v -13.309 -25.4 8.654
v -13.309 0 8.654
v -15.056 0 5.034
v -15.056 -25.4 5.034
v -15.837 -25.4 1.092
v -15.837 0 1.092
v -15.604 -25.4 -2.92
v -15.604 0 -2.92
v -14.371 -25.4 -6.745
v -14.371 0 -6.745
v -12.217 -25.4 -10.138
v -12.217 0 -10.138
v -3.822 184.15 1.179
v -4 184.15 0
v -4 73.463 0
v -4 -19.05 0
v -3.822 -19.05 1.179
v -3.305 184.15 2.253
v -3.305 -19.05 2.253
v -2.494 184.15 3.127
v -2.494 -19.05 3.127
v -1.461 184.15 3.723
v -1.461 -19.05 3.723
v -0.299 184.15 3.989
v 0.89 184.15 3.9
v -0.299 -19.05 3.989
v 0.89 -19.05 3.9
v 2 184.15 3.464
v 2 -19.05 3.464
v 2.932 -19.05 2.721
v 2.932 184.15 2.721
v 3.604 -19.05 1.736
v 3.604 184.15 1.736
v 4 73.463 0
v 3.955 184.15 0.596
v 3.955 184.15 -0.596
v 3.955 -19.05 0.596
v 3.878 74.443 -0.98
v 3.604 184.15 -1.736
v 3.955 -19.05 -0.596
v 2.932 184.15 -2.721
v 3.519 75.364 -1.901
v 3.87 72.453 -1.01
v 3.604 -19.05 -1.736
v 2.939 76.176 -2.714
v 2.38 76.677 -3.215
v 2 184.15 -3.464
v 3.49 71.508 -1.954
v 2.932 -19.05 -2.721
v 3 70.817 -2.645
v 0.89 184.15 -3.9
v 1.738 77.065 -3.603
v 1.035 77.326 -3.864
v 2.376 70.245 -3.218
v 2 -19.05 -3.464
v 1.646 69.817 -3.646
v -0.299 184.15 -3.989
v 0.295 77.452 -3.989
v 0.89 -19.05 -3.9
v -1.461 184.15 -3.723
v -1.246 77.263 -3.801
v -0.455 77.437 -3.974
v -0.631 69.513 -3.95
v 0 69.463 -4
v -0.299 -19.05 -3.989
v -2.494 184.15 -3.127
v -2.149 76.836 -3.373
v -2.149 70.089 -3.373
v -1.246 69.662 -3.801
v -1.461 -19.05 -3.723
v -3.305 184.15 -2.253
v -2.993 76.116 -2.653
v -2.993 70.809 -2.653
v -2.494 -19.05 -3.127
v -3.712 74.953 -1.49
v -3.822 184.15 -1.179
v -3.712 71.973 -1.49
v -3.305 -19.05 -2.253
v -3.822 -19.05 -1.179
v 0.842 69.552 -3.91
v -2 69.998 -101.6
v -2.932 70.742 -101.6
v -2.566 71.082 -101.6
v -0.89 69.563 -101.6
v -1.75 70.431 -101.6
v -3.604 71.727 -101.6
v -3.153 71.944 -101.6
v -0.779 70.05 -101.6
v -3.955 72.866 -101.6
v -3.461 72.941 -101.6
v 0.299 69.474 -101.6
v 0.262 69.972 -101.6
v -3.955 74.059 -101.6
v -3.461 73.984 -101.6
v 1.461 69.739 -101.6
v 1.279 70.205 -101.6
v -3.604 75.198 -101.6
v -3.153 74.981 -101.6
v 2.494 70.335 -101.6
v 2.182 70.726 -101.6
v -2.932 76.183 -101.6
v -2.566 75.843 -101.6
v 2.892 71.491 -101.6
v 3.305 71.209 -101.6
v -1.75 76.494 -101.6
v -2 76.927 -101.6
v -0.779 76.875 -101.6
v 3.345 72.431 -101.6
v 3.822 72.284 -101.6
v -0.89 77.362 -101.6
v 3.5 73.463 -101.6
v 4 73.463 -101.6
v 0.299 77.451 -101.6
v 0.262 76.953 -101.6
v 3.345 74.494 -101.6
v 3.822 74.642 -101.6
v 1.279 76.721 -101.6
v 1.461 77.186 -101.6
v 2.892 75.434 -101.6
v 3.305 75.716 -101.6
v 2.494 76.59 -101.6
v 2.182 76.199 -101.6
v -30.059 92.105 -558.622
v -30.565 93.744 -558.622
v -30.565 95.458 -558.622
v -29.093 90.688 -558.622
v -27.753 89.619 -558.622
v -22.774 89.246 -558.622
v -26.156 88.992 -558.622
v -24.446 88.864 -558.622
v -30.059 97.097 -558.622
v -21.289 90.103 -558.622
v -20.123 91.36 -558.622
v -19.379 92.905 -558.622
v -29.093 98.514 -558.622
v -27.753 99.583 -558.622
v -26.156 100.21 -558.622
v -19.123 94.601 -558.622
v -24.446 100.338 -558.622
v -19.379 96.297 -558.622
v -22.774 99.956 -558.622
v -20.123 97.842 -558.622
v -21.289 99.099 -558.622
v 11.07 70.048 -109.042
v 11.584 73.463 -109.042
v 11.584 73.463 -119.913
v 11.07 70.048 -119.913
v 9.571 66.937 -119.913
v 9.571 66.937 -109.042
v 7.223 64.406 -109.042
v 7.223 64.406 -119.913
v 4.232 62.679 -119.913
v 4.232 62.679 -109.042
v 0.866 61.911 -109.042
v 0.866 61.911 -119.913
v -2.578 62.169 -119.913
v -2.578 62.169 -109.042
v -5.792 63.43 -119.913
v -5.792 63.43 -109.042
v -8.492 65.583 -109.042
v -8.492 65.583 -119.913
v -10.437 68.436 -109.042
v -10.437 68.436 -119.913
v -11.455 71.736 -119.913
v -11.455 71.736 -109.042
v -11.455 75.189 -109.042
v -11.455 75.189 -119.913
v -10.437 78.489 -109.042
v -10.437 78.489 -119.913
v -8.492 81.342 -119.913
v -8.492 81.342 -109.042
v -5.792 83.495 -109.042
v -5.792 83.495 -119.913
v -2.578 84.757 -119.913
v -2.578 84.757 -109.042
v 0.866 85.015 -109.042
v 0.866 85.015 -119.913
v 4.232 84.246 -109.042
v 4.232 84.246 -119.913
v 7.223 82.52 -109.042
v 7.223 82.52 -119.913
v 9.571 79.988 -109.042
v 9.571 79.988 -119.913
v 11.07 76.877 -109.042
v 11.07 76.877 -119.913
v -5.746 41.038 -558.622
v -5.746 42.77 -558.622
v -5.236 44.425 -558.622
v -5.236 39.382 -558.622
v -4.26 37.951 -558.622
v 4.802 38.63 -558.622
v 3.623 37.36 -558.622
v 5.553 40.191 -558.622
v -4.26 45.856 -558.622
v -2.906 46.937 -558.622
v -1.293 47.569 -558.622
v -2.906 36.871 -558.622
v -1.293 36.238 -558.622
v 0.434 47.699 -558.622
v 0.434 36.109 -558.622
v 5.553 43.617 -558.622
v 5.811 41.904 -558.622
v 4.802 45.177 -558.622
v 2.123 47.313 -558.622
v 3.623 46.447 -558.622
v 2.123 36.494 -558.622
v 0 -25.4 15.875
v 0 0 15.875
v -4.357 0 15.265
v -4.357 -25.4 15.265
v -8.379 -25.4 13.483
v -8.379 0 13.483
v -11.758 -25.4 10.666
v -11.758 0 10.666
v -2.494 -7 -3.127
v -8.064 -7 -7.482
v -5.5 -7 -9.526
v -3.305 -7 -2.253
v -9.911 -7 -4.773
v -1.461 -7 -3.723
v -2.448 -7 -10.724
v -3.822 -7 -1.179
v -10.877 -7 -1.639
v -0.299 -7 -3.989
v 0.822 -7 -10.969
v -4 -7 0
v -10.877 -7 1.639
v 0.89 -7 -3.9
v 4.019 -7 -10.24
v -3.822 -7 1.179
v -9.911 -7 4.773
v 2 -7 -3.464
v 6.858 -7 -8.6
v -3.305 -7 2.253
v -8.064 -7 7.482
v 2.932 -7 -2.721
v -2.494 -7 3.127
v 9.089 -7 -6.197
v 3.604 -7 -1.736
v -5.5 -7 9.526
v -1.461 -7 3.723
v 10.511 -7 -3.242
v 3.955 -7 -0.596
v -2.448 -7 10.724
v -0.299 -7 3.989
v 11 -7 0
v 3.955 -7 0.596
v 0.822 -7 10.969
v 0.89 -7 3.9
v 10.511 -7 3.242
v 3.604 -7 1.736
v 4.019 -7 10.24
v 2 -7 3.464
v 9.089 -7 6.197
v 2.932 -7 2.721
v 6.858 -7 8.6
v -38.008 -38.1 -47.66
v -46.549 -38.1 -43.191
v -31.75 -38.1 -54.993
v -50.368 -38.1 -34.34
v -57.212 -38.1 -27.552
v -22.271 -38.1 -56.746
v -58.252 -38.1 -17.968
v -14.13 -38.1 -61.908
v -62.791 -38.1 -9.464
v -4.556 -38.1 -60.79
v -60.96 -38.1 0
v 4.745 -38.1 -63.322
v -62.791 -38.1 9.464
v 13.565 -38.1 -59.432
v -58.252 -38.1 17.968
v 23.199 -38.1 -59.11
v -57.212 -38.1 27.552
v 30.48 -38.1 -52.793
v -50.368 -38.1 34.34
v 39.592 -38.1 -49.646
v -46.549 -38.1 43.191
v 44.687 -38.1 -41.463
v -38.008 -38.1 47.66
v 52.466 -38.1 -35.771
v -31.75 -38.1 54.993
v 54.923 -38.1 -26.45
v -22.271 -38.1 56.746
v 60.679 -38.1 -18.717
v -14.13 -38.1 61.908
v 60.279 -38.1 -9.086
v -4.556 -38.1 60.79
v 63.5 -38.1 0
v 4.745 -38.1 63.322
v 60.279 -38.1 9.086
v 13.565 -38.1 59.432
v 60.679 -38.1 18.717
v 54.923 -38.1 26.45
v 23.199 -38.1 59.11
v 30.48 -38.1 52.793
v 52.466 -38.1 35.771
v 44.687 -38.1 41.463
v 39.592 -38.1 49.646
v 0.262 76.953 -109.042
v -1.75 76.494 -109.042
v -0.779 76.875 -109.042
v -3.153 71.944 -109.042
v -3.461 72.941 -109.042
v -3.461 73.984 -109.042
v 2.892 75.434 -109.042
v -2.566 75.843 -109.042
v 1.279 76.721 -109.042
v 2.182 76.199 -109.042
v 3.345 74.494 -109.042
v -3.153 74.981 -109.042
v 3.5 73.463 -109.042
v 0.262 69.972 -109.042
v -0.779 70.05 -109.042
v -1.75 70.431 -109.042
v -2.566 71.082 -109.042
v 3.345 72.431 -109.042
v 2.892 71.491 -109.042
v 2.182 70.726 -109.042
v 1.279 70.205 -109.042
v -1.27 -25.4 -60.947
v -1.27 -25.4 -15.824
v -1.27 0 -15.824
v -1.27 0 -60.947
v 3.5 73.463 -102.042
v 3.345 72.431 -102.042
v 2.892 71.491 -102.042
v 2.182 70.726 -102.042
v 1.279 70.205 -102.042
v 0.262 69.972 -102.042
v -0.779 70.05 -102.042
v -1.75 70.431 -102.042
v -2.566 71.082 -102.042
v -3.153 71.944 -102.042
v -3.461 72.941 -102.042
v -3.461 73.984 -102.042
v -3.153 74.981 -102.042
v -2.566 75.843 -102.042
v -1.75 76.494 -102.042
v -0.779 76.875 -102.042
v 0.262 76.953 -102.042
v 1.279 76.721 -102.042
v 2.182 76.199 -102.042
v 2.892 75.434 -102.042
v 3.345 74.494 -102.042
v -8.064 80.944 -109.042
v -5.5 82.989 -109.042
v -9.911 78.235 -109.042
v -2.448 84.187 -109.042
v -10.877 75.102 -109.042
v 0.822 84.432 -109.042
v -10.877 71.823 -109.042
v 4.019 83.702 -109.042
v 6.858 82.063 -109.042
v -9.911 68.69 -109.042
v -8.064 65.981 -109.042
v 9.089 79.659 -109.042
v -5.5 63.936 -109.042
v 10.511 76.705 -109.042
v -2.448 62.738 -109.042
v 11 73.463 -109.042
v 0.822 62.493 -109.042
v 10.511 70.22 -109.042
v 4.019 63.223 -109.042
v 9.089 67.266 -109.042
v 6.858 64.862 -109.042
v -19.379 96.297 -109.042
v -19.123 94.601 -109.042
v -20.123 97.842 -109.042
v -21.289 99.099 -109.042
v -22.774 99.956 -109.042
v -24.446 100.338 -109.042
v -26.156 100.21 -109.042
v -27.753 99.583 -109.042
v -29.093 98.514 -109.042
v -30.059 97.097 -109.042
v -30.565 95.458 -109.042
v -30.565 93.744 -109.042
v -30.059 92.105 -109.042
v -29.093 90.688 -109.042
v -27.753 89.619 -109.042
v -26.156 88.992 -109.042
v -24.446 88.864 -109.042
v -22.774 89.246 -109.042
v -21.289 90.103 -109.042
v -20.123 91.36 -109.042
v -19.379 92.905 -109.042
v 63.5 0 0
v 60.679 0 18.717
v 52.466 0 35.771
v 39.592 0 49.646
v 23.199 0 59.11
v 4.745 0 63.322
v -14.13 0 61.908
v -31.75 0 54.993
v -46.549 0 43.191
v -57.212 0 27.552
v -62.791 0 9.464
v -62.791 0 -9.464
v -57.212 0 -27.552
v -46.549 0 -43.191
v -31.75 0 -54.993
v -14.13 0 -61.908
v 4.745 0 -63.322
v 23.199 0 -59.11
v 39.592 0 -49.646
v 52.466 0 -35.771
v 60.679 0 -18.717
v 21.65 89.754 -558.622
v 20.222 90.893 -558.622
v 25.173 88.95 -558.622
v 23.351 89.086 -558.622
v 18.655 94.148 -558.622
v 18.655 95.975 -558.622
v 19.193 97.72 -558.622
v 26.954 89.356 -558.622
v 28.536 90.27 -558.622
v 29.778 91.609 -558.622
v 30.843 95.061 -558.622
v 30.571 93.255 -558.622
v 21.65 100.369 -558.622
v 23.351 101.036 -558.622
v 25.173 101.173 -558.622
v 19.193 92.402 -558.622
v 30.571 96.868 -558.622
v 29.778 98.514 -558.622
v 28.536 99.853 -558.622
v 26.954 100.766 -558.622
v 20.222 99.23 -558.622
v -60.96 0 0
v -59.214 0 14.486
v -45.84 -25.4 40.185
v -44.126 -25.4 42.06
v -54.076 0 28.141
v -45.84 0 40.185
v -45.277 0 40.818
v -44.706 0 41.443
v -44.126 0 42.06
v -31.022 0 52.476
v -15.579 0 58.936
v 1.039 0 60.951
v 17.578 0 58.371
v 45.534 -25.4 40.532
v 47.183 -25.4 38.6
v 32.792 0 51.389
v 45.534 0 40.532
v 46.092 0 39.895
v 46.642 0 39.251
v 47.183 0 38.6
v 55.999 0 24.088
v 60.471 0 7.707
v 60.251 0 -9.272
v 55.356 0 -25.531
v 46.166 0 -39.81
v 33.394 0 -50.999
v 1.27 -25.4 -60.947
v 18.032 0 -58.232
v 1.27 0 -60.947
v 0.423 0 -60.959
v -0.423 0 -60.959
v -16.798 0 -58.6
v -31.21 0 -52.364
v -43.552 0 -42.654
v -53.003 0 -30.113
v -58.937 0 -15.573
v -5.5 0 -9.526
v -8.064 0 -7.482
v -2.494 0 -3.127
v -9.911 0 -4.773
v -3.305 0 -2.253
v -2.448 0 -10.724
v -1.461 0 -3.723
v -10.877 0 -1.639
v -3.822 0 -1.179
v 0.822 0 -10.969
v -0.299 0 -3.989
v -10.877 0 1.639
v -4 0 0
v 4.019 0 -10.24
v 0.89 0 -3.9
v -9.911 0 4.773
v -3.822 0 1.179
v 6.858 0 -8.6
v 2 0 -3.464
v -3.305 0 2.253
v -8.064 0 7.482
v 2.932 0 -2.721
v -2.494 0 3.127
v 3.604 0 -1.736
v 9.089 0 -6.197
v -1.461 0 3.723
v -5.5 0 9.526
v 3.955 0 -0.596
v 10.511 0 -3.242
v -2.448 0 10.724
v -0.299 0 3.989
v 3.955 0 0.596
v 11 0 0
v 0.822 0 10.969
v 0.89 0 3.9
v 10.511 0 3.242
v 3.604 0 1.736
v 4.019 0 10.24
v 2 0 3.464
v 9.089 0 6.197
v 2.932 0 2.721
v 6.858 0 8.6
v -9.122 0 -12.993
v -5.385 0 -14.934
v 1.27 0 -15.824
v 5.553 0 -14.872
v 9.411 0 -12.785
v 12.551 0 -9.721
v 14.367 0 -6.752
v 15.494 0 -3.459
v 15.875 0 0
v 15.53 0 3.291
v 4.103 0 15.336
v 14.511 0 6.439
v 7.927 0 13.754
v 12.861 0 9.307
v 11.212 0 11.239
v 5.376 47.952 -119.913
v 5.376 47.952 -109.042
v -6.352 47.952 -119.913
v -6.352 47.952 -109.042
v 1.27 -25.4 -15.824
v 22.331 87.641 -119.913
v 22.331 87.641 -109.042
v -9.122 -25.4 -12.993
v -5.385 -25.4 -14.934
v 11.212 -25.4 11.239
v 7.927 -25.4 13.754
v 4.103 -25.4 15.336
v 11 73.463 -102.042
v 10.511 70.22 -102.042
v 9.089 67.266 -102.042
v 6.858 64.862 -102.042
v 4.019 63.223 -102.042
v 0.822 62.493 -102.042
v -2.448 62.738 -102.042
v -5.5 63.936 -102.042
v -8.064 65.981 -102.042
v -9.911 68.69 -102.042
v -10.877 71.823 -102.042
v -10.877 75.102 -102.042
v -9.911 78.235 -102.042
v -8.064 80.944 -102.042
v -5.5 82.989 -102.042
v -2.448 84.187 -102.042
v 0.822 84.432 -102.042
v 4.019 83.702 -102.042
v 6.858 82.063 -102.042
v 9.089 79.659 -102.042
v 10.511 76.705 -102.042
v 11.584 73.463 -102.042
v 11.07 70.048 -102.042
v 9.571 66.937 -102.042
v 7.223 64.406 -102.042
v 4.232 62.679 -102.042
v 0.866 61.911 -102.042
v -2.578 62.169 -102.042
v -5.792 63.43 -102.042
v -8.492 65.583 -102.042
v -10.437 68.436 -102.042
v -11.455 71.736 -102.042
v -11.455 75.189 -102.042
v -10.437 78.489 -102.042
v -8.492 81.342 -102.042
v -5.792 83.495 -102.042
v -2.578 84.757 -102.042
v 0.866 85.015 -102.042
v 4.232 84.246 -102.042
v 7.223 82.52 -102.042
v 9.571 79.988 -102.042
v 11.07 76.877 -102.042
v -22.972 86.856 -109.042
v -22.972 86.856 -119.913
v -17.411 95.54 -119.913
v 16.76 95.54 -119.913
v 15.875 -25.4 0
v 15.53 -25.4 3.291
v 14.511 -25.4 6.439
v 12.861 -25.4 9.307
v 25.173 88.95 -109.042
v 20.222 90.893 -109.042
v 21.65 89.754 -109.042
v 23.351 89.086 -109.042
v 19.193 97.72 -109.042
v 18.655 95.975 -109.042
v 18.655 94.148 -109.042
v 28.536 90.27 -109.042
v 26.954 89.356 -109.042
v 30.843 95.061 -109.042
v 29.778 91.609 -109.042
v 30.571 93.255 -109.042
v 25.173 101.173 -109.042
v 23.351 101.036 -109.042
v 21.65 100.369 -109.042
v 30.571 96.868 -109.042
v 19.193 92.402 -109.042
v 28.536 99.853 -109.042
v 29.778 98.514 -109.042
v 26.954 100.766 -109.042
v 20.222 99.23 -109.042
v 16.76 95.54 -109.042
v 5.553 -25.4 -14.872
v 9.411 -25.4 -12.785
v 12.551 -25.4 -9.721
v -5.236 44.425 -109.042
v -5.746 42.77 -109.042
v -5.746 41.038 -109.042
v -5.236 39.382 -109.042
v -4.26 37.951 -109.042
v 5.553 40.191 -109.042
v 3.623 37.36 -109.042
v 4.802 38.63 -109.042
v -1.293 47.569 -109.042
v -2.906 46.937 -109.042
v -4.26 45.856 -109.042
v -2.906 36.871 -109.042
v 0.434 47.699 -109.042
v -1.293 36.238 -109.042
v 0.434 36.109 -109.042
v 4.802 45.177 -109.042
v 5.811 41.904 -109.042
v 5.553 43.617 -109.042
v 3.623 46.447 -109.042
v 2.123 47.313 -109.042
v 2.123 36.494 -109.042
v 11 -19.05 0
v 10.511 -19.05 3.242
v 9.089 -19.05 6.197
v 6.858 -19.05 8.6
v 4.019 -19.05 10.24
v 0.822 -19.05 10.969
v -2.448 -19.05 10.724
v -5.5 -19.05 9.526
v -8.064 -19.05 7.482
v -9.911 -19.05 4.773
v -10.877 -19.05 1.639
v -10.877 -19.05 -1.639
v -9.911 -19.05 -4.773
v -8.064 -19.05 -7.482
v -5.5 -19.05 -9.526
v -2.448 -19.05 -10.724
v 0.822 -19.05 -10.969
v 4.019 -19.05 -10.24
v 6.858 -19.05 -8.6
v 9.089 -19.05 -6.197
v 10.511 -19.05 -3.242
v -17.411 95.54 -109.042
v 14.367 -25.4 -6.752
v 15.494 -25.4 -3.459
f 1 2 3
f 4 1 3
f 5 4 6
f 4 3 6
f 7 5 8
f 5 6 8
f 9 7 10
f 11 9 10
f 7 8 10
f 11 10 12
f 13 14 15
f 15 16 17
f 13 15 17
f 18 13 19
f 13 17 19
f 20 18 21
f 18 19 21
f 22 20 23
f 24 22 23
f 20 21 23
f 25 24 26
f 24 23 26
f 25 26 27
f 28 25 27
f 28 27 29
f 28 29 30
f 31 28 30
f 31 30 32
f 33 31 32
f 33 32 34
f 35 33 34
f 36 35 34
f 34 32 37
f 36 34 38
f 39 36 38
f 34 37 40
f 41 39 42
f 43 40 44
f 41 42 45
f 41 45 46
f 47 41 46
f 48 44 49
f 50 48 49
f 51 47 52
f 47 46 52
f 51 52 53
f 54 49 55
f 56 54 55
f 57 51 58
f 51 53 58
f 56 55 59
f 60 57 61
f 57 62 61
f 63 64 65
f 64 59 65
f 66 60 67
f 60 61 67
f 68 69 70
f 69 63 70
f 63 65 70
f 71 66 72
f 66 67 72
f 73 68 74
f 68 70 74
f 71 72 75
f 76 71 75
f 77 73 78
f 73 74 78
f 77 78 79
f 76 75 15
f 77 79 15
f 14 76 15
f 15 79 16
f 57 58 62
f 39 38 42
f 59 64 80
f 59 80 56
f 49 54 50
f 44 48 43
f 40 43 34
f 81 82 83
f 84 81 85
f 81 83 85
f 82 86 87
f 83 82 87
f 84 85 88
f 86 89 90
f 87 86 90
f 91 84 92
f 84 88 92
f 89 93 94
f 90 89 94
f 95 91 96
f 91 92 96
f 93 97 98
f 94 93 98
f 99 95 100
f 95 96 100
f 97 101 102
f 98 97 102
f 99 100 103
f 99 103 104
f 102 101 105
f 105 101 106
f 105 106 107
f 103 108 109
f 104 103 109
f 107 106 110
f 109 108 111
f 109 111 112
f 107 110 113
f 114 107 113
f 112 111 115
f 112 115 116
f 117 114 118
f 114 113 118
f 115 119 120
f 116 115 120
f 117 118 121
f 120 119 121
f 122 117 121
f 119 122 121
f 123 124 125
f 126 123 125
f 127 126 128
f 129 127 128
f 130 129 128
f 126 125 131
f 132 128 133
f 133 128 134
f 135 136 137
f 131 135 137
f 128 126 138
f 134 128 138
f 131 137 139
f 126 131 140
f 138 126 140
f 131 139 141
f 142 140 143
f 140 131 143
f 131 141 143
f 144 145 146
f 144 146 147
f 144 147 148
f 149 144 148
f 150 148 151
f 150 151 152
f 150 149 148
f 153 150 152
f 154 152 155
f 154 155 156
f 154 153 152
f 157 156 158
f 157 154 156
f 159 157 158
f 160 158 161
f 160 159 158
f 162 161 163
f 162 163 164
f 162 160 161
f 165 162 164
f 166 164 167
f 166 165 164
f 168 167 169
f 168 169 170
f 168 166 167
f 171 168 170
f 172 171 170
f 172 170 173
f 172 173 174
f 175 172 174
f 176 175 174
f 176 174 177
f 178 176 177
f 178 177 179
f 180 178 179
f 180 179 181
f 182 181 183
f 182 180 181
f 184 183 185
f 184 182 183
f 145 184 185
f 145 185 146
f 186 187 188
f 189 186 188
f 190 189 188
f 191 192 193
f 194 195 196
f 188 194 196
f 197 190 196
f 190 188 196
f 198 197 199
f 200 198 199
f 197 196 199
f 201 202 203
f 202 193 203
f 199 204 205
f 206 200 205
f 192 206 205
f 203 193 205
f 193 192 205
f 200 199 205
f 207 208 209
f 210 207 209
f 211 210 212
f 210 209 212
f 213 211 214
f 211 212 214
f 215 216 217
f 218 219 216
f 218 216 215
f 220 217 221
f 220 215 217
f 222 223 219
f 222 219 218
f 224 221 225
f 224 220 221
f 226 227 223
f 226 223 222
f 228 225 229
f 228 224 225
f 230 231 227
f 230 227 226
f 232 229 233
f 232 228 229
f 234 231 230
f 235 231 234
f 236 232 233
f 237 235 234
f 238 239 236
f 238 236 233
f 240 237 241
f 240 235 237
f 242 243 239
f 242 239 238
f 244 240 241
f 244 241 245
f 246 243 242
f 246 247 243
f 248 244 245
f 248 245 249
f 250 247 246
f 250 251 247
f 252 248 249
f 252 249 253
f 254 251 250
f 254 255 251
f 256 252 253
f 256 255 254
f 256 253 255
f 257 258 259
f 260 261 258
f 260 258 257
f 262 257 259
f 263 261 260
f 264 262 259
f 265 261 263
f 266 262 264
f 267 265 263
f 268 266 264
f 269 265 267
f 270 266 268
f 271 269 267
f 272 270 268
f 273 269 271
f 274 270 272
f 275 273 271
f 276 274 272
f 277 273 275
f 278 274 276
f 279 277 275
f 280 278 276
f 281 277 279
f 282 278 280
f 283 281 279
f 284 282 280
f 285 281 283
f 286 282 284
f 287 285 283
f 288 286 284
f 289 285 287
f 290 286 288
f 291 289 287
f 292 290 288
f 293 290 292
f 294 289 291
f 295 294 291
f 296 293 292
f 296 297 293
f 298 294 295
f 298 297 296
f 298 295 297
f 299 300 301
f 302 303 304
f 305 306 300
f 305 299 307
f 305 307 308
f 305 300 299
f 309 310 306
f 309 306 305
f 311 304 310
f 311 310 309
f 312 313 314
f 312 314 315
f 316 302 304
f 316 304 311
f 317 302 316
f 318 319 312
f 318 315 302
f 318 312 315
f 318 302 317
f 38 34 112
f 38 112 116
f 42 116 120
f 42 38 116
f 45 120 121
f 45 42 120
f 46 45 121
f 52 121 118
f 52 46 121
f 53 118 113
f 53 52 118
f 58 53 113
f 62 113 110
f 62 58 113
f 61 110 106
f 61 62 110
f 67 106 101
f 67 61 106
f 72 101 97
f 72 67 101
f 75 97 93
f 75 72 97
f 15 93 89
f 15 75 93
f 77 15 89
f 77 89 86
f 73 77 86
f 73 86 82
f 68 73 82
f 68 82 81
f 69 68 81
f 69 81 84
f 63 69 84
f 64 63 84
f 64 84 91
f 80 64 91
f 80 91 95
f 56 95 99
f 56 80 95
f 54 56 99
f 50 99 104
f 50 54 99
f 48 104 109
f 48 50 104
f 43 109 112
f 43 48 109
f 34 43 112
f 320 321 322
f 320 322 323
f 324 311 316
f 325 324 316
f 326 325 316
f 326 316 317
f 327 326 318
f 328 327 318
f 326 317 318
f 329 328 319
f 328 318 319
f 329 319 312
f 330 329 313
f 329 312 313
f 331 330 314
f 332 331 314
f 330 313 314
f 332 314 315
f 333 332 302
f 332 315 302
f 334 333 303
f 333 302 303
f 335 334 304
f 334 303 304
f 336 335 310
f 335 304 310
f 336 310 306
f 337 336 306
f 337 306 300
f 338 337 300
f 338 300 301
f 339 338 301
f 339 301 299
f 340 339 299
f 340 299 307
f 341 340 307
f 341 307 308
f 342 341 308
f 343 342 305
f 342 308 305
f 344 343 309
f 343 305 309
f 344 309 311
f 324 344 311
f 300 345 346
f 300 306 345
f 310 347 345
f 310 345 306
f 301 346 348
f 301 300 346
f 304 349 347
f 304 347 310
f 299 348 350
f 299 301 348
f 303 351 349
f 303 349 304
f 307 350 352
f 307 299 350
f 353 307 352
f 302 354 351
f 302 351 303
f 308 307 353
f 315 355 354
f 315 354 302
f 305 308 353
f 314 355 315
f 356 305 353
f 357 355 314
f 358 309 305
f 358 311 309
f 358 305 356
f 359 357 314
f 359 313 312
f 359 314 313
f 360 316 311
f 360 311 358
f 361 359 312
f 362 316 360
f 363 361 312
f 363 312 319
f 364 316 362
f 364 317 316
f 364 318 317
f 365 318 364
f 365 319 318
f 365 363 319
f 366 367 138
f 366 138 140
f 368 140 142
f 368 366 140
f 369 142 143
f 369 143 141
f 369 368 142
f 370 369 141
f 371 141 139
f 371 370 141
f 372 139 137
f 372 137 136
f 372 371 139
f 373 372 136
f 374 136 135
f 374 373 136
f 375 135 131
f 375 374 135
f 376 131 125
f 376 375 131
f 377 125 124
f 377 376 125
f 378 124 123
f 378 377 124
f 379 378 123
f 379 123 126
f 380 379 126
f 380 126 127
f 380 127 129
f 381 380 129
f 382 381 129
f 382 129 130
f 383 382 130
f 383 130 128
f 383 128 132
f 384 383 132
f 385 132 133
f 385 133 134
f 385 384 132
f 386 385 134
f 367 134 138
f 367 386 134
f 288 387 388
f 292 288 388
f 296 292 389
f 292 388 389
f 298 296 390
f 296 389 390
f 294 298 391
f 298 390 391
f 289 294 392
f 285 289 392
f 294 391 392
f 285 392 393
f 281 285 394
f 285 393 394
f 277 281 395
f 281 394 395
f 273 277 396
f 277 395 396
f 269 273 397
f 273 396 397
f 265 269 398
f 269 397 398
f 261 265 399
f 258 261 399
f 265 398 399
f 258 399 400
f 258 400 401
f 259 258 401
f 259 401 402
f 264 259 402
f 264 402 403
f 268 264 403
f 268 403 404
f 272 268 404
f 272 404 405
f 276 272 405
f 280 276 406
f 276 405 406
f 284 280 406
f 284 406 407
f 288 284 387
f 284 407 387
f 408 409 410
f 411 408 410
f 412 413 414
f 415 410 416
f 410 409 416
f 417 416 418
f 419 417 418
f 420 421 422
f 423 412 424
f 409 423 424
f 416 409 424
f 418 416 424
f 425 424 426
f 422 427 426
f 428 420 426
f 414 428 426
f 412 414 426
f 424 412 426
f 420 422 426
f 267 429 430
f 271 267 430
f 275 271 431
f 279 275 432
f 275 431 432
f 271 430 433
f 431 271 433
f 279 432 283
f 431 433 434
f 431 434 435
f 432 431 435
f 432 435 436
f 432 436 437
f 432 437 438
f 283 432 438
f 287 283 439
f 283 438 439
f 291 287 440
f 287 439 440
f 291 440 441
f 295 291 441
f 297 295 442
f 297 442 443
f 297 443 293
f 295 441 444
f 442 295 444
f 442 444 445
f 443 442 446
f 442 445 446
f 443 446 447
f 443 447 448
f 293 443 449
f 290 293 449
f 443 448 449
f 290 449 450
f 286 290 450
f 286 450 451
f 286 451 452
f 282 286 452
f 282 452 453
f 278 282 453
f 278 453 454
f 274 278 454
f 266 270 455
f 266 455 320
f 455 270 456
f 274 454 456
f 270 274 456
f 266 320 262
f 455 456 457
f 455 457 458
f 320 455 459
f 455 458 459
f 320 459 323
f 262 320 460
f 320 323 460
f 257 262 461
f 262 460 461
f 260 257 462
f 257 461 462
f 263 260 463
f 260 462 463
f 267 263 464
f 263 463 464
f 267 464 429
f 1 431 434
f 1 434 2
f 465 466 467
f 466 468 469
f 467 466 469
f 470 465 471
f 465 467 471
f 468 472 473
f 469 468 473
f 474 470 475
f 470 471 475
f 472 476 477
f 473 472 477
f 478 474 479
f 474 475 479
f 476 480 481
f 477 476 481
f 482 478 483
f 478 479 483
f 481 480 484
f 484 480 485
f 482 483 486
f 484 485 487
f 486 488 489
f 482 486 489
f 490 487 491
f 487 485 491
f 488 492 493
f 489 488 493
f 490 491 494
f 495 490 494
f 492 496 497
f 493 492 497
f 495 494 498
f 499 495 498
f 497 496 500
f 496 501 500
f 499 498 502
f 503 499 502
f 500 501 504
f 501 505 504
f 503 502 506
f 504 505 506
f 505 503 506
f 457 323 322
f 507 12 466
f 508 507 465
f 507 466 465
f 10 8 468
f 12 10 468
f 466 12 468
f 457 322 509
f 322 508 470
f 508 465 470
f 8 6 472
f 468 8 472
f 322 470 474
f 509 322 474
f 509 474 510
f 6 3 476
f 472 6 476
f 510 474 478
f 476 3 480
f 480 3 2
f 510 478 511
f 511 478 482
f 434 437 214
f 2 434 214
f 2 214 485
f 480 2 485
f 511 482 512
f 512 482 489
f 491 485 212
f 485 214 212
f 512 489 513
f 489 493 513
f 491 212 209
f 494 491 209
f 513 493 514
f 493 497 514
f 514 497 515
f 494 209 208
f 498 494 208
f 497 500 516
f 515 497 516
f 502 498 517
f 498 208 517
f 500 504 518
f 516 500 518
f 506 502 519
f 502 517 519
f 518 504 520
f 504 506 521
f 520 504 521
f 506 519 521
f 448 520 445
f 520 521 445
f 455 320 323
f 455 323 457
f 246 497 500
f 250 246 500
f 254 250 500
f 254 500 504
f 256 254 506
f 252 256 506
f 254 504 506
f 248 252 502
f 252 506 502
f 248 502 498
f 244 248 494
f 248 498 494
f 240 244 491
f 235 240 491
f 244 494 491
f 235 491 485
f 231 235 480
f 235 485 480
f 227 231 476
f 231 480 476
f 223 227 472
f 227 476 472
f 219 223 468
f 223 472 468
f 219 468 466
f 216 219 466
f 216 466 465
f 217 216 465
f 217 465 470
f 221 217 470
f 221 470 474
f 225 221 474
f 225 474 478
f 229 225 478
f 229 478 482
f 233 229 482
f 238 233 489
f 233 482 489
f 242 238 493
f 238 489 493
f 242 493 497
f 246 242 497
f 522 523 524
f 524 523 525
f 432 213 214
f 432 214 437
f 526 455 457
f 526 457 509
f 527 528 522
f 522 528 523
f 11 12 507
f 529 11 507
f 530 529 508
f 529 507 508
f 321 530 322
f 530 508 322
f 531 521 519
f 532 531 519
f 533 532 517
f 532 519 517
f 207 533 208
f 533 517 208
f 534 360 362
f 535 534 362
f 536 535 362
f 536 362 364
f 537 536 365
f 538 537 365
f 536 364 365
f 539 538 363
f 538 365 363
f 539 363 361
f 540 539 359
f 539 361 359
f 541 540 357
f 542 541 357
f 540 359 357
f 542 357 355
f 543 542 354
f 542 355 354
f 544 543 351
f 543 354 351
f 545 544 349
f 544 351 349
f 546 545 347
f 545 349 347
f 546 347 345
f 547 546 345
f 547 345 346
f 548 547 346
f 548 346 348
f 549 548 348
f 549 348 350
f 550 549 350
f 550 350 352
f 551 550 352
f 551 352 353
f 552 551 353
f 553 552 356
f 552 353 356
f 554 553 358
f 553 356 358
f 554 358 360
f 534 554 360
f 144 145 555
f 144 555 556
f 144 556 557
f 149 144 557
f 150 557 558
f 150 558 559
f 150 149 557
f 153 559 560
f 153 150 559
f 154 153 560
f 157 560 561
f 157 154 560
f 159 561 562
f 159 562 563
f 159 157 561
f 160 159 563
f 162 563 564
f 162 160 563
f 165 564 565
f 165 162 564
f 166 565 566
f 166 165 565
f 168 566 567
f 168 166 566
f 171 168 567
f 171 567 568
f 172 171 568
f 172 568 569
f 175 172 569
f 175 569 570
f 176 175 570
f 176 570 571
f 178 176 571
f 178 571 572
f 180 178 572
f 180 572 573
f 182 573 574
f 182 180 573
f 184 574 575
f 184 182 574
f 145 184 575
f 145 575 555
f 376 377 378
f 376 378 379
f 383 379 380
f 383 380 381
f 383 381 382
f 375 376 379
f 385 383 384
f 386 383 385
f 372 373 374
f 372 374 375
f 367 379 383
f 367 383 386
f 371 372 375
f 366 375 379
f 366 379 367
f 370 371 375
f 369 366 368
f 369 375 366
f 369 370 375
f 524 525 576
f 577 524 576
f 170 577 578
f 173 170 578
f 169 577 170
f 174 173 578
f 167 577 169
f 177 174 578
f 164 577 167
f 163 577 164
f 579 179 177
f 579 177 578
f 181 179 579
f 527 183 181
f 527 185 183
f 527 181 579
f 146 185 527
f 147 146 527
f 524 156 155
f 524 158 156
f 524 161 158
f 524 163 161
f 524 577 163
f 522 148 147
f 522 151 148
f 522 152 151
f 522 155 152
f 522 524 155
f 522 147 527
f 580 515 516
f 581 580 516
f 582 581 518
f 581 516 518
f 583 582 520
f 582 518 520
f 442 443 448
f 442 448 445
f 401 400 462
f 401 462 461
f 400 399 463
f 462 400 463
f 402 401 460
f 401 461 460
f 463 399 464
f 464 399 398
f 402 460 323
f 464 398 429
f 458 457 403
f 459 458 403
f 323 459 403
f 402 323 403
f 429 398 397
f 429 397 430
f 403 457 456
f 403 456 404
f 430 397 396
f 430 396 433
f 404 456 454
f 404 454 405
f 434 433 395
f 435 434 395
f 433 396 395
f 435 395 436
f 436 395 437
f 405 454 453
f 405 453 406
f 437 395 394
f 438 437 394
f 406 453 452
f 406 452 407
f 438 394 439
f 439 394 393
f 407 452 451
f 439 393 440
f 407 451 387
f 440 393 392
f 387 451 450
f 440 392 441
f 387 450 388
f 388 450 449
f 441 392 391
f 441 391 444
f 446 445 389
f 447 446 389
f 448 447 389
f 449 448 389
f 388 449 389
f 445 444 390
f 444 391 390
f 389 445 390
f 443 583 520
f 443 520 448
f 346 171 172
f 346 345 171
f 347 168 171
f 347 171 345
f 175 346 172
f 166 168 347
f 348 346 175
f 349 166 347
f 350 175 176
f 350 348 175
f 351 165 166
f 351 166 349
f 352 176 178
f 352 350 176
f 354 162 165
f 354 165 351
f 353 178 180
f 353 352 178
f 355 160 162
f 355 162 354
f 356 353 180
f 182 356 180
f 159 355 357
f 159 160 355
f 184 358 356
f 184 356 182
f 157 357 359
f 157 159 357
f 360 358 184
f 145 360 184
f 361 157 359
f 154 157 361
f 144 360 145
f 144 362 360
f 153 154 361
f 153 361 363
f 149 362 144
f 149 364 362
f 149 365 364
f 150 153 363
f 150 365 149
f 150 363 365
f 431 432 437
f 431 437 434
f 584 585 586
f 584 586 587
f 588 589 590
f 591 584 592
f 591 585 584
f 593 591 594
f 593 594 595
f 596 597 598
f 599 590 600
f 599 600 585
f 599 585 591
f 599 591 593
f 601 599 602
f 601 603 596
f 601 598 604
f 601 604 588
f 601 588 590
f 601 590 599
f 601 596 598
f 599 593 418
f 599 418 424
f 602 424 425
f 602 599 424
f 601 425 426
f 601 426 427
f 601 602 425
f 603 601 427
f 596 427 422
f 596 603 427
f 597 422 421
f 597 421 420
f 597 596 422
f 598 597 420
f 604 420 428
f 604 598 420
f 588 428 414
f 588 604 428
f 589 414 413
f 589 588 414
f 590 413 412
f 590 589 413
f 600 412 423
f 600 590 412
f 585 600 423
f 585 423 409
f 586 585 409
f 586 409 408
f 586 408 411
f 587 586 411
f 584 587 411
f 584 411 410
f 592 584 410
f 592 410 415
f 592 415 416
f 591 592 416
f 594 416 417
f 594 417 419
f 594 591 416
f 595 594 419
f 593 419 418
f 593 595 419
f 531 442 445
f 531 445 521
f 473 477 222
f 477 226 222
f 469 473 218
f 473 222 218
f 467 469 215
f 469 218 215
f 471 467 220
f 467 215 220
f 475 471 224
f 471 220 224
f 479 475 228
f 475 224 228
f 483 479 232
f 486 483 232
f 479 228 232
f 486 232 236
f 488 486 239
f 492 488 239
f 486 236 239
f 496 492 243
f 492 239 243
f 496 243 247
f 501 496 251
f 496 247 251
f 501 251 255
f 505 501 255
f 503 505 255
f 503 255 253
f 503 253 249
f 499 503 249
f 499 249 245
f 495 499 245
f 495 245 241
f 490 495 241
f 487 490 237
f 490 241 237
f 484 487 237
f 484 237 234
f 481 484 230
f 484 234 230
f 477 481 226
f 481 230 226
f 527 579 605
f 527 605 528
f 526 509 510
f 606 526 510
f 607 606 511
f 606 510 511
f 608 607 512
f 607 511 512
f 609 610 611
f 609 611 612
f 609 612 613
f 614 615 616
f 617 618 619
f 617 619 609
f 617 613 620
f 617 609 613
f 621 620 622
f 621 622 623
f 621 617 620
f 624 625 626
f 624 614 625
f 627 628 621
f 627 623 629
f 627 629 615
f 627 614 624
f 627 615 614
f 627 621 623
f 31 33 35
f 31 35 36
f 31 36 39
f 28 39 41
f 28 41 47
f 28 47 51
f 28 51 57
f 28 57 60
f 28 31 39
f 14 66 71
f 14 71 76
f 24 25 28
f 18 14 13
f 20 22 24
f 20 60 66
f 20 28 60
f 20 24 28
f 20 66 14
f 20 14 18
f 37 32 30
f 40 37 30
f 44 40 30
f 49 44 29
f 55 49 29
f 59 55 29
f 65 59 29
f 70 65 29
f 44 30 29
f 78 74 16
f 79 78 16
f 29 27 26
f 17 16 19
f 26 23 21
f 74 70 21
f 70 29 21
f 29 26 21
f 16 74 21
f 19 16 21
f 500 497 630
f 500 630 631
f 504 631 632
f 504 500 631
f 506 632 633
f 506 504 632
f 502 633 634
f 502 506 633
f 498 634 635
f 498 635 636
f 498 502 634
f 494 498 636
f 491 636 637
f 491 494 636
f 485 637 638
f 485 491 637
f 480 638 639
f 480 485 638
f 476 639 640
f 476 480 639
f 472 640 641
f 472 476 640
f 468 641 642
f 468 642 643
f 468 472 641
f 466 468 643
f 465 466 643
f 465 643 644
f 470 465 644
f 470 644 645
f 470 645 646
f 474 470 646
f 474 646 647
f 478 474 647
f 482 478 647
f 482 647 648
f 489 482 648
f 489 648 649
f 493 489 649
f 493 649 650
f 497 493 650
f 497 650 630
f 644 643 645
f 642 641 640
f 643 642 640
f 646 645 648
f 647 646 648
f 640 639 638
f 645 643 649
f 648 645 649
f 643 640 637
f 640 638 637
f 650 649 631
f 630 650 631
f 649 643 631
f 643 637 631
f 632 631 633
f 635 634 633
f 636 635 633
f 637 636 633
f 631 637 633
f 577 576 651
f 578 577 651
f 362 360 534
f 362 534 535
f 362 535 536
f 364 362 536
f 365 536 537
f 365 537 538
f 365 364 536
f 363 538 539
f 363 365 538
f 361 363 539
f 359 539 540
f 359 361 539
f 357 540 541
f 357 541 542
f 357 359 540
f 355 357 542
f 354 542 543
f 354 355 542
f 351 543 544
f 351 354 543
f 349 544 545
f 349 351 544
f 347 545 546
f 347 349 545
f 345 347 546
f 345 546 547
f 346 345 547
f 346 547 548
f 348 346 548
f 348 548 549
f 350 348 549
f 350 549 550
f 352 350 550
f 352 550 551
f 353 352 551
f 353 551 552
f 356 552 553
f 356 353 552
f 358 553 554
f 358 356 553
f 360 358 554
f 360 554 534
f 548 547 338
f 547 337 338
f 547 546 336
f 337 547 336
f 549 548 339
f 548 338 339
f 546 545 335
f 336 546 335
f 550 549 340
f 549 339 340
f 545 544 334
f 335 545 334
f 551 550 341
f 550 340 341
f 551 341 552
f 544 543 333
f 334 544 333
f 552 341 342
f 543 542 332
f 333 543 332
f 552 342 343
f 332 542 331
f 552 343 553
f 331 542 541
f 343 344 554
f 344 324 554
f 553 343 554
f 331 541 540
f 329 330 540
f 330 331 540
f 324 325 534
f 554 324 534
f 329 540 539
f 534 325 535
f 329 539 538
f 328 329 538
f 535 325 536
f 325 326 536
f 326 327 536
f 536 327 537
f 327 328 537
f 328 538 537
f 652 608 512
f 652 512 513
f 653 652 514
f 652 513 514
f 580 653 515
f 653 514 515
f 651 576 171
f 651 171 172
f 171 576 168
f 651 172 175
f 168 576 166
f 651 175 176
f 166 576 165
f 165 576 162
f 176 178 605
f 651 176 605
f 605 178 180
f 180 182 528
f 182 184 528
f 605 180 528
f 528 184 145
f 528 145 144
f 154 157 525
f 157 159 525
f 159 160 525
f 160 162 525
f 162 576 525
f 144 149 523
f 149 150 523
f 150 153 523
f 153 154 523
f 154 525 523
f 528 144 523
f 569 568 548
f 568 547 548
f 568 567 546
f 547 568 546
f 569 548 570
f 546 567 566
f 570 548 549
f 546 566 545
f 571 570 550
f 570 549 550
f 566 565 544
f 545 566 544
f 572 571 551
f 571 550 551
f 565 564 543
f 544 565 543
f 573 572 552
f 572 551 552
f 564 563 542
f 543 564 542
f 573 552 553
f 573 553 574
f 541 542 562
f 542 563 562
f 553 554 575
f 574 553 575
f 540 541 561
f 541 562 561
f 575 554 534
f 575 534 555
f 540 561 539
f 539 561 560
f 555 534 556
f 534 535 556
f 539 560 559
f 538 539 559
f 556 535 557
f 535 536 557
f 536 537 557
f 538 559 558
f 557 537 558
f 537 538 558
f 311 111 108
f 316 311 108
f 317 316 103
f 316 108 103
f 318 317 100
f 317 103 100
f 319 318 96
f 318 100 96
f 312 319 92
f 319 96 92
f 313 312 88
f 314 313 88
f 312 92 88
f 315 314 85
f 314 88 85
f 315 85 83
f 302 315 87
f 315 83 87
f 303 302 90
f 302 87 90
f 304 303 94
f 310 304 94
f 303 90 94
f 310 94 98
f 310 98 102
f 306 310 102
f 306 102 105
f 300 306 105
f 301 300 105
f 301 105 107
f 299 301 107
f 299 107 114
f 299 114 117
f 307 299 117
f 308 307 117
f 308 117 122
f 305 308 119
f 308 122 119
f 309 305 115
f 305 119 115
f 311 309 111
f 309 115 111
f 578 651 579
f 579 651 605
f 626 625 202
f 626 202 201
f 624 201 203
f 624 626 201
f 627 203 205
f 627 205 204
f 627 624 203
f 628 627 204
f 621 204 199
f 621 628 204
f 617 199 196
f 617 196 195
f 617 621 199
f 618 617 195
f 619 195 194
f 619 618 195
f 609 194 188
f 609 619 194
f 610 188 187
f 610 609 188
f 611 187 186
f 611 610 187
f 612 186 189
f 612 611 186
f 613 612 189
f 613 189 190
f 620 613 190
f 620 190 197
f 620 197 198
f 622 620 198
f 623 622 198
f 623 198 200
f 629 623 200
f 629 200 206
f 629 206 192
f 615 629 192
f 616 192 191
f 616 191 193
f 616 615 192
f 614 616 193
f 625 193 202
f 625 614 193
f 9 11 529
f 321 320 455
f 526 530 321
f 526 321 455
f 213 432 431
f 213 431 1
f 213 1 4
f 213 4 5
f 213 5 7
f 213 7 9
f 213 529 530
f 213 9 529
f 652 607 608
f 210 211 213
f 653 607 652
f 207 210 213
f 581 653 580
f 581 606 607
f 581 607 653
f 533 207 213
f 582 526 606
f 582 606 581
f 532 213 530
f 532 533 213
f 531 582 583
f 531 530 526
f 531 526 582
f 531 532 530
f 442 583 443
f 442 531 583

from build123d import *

# Parameters (mm, degrees)
F0_R      = 63.5
F1_DEPTH  = 38.1
F3_D      = 121.92
F4_R      = 11
F5_DEPTH  = 25.4
F7_DEPTH  = 25.4
F8_R      = 11
F9_DEPTH  = 7
F11_D     = 8
F11_DEPTH = 7
F11_TIP   = 2.4034424761
F12_R     = 11
F13_DEPTH = 6.35
F14_R     = 4
F15_DEPTH = 203.2
F16_R     = 4
F17_DEPTH = 101.6
F18_R     = 3.5
F19_DEPTH = 7.4422
F20_R     = 11
F20_R_2   = 3.5
F21_DEPTH = 7
F22_R     = 11.584423549
F22_R_2   = 11
F23_DEPTH = 7
F24_R     = 11.584423549
F25_DEPTH = 10.8712
F26_R     = 5.7529740036
F27_DEPTH = 449.58
F26_R_2   = 5.8113326004
F26_R_3   = 6.1284704767


with BuildPart() as f1:
    # F0 (on Front) → F1 (new body)
    with BuildSketch(Plane.XZ):
        Circle(F0_R)
    extrude(amount=F1_DEPTH)

    # F3 (through all)
    with Locations(Plane.XZ.offset(38.1)):
        with Locations((0, 0)):
            Hole(F3_D / 2)



with BuildPart() as f5:
    # F4 (on Front) → F5 (new body)
    with BuildSketch(Plane.XZ):
        with BuildLine():
            ThreePointArc((12.5508166542, -9.7207317787), (15.0209826474, -5.1367017927), (15.875, 0))
            ThreePointArc((15.875, 0), (11.2253201513, 11.2253201513), (0, 15.875))
            ThreePointArc((0, 15.875), (-14.3692530341, 6.7483473713), (-12.2165305121, -10.1376529457))
            ThreePointArc((-12.2165305121, -10.1376529457), (0.2671939765, -15.8727512542), (12.5508166542, -9.7207317787))
        make_face()
        Circle(F4_R, mode=Mode.SUBTRACT)
    extrude(amount=F5_DEPTH)


with BuildPart() as f1_1:
    add(f1.part)

    add(f5.part)  # F7 merges F5
    # F6 (on face) → F7 (join)
    with BuildSketch(Plane.XZ.offset(25.4)):
        with BuildLine():
            Line((-11.7582414079, 10.6658044232), (-44.1259771522, 42.059716361))
            Line((-44.1259771522, 42.059716361), (-45.8397811787, 40.1850228504))
            Line((-45.8397811787, 40.1850228504), (-13.3087949682, 8.6539933842))
            ThreePointArc((-13.3087949682, 8.6539933842), (-12.5738189936, 9.6909597521), (-11.7582414079, 10.6658044232))
        make_face()
        with BuildLine():
            Line((12.8607880394, 9.3067586198), (47.1825025581, 38.5996509357))
            Line((47.1825025581, 38.5996509357), (45.533575801, 40.5316552188))
            Line((45.533575801, 40.5316552188), (11.2118612823, 11.2387629029))
            ThreePointArc((11.2118612823, 11.2387629029), (12.0750267693, 10.3057922316), (12.8607880394, 9.3067586198))
        make_face()
        with BuildLine():
            Line((-1.27, -60.9467693976), (1.27, -60.9467693976))
            Line((1.27, -60.9467693976), (1.27, -15.8241184589))
            ThreePointArc((1.27, -15.8241184589), (0, -15.875), (-1.27, -15.8241184589))
            Line((-1.27, -15.8241184589), (-1.27, -60.9467693976))
        make_face()
    extrude(amount=-F7_DEPTH)

    # F12 (on face) → F13 (join)
    with BuildSketch(Plane.XZ.offset(25.4)):
        Circle(F12_R)
    extrude(amount=-F13_DEPTH)


with BuildPart() as f9:
    # F8 (on Front) → F9 (new body)
    with BuildSketch(Plane.XZ):
        Circle(F8_R)
    extrude(amount=F9_DEPTH)

    # F11
    with Locations(Plane(origin=(0, 0, 0), x_dir=(1, 0, 0), z_dir=(0, 1, 0))):
        with Locations((0, 0)):
            Hole(F11_D / 2, depth=F11_DEPTH)
            with Locations((0, 0, -(F11_DEPTH + F11_TIP / 2))):  # 118° drill point
                Cone(0, F11_D / 2, F11_TIP, mode=Mode.SUBTRACT)


with BuildPart() as f15:
    # F14 (on face) → F15 (new body)
    with BuildSketch(Plane(origin=(0, -19.05, 0), x_dir=(-1, 0, 0), z_dir=(0, 1, 0))):
        Circle(F14_R)
    extrude(amount=F15_DEPTH)

    # F16 (on Top) → F17 (join)
    with BuildSketch(Plane.XY):
        with Locations((0, 73.4625874707)):
            Circle(F16_R)
    extrude(amount=-F17_DEPTH)

    # F18 (on face) → F19 (join)
    with BuildSketch(Plane(origin=(0, 0, -101.6), x_dir=(1, 0, 0), z_dir=(0, 0, -1))):
        with Locations((0, -73.4625874707)):
            Circle(F18_R)
    extrude(amount=F19_DEPTH)


with BuildPart() as f21:
    # F20 (on face) → F21 (new body)
    with BuildSketch(Plane(origin=(0, 0, -109.0422), x_dir=(1, 0, 0), z_dir=(0, 0, -1))):
        with Locations((0, -73.4625874707)):
            Circle(F20_R)
        with Locations((0, -73.4625874707)):
            Circle(F20_R_2, mode=Mode.SUBTRACT)
    extrude(amount=-F21_DEPTH)


with BuildPart() as f23:
    # F22 (on face) → F23 (new body)
    with BuildSketch(Plane(origin=(0, 0, -109.0422), x_dir=(1, 0, 0), z_dir=(0, 0, -1))):
        with Locations((0, -73.4625874707)):
            Circle(F22_R)
        with Locations((0, -73.4625874707)):
            Circle(F22_R_2, mode=Mode.SUBTRACT)
    extrude(amount=-F23_DEPTH)


with BuildPart() as f25:
    # F24 (on face) → F25 (new body)
    with BuildSketch(Plane(origin=(0, 0, -109.0422), x_dir=(1, 0, 0), z_dir=(0, 0, -1))):
        Polygon((-22.9720189005, -86.8556248707), (-17.4109060317, -95.5397163391), (16.7600270361, -95.5397163391), (22.3313096363, -87.6411880186), (5.3758203067, -47.951799591), (-6.3521257616, -47.951799591), align=None)
        with Locations((0, -73.4625874707)):
            Circle(F24_R, mode=Mode.SUBTRACT)
    extrude(amount=F25_DEPTH)


with BuildPart() as f27:
    # F26 (on face) → F27 (new body)
    with BuildSketch(Plane.XY.offset(-109.0422)):
        with Locations((-24.8760152608, 94.6010127664)):
            Circle(F26_R)
    extrude(amount=-F27_DEPTH)


with BuildPart() as f27b:
    # F26 (on face) → F27, piece 2 (new body)
    with BuildSketch(Plane.XY.offset(-109.0422)):
        with Locations((0, 41.9037491083)):
            Circle(F26_R_2)
    extrude(amount=-F27_DEPTH)


with BuildPart() as f27c:
    # F26 (on face) → F27, piece 3 (new body)
    with BuildSketch(Plane.XY.offset(-109.0422)):
        with Locations((24.7146431357, 95.061250031)):
            Circle(F26_R_3)
    extrude(amount=-F27_DEPTH)


solid = Compound([f1_1.part, f9.part, f15.part, f21.part, f23.part, f25.part, f27.part, f27b.part, f27c.part])
